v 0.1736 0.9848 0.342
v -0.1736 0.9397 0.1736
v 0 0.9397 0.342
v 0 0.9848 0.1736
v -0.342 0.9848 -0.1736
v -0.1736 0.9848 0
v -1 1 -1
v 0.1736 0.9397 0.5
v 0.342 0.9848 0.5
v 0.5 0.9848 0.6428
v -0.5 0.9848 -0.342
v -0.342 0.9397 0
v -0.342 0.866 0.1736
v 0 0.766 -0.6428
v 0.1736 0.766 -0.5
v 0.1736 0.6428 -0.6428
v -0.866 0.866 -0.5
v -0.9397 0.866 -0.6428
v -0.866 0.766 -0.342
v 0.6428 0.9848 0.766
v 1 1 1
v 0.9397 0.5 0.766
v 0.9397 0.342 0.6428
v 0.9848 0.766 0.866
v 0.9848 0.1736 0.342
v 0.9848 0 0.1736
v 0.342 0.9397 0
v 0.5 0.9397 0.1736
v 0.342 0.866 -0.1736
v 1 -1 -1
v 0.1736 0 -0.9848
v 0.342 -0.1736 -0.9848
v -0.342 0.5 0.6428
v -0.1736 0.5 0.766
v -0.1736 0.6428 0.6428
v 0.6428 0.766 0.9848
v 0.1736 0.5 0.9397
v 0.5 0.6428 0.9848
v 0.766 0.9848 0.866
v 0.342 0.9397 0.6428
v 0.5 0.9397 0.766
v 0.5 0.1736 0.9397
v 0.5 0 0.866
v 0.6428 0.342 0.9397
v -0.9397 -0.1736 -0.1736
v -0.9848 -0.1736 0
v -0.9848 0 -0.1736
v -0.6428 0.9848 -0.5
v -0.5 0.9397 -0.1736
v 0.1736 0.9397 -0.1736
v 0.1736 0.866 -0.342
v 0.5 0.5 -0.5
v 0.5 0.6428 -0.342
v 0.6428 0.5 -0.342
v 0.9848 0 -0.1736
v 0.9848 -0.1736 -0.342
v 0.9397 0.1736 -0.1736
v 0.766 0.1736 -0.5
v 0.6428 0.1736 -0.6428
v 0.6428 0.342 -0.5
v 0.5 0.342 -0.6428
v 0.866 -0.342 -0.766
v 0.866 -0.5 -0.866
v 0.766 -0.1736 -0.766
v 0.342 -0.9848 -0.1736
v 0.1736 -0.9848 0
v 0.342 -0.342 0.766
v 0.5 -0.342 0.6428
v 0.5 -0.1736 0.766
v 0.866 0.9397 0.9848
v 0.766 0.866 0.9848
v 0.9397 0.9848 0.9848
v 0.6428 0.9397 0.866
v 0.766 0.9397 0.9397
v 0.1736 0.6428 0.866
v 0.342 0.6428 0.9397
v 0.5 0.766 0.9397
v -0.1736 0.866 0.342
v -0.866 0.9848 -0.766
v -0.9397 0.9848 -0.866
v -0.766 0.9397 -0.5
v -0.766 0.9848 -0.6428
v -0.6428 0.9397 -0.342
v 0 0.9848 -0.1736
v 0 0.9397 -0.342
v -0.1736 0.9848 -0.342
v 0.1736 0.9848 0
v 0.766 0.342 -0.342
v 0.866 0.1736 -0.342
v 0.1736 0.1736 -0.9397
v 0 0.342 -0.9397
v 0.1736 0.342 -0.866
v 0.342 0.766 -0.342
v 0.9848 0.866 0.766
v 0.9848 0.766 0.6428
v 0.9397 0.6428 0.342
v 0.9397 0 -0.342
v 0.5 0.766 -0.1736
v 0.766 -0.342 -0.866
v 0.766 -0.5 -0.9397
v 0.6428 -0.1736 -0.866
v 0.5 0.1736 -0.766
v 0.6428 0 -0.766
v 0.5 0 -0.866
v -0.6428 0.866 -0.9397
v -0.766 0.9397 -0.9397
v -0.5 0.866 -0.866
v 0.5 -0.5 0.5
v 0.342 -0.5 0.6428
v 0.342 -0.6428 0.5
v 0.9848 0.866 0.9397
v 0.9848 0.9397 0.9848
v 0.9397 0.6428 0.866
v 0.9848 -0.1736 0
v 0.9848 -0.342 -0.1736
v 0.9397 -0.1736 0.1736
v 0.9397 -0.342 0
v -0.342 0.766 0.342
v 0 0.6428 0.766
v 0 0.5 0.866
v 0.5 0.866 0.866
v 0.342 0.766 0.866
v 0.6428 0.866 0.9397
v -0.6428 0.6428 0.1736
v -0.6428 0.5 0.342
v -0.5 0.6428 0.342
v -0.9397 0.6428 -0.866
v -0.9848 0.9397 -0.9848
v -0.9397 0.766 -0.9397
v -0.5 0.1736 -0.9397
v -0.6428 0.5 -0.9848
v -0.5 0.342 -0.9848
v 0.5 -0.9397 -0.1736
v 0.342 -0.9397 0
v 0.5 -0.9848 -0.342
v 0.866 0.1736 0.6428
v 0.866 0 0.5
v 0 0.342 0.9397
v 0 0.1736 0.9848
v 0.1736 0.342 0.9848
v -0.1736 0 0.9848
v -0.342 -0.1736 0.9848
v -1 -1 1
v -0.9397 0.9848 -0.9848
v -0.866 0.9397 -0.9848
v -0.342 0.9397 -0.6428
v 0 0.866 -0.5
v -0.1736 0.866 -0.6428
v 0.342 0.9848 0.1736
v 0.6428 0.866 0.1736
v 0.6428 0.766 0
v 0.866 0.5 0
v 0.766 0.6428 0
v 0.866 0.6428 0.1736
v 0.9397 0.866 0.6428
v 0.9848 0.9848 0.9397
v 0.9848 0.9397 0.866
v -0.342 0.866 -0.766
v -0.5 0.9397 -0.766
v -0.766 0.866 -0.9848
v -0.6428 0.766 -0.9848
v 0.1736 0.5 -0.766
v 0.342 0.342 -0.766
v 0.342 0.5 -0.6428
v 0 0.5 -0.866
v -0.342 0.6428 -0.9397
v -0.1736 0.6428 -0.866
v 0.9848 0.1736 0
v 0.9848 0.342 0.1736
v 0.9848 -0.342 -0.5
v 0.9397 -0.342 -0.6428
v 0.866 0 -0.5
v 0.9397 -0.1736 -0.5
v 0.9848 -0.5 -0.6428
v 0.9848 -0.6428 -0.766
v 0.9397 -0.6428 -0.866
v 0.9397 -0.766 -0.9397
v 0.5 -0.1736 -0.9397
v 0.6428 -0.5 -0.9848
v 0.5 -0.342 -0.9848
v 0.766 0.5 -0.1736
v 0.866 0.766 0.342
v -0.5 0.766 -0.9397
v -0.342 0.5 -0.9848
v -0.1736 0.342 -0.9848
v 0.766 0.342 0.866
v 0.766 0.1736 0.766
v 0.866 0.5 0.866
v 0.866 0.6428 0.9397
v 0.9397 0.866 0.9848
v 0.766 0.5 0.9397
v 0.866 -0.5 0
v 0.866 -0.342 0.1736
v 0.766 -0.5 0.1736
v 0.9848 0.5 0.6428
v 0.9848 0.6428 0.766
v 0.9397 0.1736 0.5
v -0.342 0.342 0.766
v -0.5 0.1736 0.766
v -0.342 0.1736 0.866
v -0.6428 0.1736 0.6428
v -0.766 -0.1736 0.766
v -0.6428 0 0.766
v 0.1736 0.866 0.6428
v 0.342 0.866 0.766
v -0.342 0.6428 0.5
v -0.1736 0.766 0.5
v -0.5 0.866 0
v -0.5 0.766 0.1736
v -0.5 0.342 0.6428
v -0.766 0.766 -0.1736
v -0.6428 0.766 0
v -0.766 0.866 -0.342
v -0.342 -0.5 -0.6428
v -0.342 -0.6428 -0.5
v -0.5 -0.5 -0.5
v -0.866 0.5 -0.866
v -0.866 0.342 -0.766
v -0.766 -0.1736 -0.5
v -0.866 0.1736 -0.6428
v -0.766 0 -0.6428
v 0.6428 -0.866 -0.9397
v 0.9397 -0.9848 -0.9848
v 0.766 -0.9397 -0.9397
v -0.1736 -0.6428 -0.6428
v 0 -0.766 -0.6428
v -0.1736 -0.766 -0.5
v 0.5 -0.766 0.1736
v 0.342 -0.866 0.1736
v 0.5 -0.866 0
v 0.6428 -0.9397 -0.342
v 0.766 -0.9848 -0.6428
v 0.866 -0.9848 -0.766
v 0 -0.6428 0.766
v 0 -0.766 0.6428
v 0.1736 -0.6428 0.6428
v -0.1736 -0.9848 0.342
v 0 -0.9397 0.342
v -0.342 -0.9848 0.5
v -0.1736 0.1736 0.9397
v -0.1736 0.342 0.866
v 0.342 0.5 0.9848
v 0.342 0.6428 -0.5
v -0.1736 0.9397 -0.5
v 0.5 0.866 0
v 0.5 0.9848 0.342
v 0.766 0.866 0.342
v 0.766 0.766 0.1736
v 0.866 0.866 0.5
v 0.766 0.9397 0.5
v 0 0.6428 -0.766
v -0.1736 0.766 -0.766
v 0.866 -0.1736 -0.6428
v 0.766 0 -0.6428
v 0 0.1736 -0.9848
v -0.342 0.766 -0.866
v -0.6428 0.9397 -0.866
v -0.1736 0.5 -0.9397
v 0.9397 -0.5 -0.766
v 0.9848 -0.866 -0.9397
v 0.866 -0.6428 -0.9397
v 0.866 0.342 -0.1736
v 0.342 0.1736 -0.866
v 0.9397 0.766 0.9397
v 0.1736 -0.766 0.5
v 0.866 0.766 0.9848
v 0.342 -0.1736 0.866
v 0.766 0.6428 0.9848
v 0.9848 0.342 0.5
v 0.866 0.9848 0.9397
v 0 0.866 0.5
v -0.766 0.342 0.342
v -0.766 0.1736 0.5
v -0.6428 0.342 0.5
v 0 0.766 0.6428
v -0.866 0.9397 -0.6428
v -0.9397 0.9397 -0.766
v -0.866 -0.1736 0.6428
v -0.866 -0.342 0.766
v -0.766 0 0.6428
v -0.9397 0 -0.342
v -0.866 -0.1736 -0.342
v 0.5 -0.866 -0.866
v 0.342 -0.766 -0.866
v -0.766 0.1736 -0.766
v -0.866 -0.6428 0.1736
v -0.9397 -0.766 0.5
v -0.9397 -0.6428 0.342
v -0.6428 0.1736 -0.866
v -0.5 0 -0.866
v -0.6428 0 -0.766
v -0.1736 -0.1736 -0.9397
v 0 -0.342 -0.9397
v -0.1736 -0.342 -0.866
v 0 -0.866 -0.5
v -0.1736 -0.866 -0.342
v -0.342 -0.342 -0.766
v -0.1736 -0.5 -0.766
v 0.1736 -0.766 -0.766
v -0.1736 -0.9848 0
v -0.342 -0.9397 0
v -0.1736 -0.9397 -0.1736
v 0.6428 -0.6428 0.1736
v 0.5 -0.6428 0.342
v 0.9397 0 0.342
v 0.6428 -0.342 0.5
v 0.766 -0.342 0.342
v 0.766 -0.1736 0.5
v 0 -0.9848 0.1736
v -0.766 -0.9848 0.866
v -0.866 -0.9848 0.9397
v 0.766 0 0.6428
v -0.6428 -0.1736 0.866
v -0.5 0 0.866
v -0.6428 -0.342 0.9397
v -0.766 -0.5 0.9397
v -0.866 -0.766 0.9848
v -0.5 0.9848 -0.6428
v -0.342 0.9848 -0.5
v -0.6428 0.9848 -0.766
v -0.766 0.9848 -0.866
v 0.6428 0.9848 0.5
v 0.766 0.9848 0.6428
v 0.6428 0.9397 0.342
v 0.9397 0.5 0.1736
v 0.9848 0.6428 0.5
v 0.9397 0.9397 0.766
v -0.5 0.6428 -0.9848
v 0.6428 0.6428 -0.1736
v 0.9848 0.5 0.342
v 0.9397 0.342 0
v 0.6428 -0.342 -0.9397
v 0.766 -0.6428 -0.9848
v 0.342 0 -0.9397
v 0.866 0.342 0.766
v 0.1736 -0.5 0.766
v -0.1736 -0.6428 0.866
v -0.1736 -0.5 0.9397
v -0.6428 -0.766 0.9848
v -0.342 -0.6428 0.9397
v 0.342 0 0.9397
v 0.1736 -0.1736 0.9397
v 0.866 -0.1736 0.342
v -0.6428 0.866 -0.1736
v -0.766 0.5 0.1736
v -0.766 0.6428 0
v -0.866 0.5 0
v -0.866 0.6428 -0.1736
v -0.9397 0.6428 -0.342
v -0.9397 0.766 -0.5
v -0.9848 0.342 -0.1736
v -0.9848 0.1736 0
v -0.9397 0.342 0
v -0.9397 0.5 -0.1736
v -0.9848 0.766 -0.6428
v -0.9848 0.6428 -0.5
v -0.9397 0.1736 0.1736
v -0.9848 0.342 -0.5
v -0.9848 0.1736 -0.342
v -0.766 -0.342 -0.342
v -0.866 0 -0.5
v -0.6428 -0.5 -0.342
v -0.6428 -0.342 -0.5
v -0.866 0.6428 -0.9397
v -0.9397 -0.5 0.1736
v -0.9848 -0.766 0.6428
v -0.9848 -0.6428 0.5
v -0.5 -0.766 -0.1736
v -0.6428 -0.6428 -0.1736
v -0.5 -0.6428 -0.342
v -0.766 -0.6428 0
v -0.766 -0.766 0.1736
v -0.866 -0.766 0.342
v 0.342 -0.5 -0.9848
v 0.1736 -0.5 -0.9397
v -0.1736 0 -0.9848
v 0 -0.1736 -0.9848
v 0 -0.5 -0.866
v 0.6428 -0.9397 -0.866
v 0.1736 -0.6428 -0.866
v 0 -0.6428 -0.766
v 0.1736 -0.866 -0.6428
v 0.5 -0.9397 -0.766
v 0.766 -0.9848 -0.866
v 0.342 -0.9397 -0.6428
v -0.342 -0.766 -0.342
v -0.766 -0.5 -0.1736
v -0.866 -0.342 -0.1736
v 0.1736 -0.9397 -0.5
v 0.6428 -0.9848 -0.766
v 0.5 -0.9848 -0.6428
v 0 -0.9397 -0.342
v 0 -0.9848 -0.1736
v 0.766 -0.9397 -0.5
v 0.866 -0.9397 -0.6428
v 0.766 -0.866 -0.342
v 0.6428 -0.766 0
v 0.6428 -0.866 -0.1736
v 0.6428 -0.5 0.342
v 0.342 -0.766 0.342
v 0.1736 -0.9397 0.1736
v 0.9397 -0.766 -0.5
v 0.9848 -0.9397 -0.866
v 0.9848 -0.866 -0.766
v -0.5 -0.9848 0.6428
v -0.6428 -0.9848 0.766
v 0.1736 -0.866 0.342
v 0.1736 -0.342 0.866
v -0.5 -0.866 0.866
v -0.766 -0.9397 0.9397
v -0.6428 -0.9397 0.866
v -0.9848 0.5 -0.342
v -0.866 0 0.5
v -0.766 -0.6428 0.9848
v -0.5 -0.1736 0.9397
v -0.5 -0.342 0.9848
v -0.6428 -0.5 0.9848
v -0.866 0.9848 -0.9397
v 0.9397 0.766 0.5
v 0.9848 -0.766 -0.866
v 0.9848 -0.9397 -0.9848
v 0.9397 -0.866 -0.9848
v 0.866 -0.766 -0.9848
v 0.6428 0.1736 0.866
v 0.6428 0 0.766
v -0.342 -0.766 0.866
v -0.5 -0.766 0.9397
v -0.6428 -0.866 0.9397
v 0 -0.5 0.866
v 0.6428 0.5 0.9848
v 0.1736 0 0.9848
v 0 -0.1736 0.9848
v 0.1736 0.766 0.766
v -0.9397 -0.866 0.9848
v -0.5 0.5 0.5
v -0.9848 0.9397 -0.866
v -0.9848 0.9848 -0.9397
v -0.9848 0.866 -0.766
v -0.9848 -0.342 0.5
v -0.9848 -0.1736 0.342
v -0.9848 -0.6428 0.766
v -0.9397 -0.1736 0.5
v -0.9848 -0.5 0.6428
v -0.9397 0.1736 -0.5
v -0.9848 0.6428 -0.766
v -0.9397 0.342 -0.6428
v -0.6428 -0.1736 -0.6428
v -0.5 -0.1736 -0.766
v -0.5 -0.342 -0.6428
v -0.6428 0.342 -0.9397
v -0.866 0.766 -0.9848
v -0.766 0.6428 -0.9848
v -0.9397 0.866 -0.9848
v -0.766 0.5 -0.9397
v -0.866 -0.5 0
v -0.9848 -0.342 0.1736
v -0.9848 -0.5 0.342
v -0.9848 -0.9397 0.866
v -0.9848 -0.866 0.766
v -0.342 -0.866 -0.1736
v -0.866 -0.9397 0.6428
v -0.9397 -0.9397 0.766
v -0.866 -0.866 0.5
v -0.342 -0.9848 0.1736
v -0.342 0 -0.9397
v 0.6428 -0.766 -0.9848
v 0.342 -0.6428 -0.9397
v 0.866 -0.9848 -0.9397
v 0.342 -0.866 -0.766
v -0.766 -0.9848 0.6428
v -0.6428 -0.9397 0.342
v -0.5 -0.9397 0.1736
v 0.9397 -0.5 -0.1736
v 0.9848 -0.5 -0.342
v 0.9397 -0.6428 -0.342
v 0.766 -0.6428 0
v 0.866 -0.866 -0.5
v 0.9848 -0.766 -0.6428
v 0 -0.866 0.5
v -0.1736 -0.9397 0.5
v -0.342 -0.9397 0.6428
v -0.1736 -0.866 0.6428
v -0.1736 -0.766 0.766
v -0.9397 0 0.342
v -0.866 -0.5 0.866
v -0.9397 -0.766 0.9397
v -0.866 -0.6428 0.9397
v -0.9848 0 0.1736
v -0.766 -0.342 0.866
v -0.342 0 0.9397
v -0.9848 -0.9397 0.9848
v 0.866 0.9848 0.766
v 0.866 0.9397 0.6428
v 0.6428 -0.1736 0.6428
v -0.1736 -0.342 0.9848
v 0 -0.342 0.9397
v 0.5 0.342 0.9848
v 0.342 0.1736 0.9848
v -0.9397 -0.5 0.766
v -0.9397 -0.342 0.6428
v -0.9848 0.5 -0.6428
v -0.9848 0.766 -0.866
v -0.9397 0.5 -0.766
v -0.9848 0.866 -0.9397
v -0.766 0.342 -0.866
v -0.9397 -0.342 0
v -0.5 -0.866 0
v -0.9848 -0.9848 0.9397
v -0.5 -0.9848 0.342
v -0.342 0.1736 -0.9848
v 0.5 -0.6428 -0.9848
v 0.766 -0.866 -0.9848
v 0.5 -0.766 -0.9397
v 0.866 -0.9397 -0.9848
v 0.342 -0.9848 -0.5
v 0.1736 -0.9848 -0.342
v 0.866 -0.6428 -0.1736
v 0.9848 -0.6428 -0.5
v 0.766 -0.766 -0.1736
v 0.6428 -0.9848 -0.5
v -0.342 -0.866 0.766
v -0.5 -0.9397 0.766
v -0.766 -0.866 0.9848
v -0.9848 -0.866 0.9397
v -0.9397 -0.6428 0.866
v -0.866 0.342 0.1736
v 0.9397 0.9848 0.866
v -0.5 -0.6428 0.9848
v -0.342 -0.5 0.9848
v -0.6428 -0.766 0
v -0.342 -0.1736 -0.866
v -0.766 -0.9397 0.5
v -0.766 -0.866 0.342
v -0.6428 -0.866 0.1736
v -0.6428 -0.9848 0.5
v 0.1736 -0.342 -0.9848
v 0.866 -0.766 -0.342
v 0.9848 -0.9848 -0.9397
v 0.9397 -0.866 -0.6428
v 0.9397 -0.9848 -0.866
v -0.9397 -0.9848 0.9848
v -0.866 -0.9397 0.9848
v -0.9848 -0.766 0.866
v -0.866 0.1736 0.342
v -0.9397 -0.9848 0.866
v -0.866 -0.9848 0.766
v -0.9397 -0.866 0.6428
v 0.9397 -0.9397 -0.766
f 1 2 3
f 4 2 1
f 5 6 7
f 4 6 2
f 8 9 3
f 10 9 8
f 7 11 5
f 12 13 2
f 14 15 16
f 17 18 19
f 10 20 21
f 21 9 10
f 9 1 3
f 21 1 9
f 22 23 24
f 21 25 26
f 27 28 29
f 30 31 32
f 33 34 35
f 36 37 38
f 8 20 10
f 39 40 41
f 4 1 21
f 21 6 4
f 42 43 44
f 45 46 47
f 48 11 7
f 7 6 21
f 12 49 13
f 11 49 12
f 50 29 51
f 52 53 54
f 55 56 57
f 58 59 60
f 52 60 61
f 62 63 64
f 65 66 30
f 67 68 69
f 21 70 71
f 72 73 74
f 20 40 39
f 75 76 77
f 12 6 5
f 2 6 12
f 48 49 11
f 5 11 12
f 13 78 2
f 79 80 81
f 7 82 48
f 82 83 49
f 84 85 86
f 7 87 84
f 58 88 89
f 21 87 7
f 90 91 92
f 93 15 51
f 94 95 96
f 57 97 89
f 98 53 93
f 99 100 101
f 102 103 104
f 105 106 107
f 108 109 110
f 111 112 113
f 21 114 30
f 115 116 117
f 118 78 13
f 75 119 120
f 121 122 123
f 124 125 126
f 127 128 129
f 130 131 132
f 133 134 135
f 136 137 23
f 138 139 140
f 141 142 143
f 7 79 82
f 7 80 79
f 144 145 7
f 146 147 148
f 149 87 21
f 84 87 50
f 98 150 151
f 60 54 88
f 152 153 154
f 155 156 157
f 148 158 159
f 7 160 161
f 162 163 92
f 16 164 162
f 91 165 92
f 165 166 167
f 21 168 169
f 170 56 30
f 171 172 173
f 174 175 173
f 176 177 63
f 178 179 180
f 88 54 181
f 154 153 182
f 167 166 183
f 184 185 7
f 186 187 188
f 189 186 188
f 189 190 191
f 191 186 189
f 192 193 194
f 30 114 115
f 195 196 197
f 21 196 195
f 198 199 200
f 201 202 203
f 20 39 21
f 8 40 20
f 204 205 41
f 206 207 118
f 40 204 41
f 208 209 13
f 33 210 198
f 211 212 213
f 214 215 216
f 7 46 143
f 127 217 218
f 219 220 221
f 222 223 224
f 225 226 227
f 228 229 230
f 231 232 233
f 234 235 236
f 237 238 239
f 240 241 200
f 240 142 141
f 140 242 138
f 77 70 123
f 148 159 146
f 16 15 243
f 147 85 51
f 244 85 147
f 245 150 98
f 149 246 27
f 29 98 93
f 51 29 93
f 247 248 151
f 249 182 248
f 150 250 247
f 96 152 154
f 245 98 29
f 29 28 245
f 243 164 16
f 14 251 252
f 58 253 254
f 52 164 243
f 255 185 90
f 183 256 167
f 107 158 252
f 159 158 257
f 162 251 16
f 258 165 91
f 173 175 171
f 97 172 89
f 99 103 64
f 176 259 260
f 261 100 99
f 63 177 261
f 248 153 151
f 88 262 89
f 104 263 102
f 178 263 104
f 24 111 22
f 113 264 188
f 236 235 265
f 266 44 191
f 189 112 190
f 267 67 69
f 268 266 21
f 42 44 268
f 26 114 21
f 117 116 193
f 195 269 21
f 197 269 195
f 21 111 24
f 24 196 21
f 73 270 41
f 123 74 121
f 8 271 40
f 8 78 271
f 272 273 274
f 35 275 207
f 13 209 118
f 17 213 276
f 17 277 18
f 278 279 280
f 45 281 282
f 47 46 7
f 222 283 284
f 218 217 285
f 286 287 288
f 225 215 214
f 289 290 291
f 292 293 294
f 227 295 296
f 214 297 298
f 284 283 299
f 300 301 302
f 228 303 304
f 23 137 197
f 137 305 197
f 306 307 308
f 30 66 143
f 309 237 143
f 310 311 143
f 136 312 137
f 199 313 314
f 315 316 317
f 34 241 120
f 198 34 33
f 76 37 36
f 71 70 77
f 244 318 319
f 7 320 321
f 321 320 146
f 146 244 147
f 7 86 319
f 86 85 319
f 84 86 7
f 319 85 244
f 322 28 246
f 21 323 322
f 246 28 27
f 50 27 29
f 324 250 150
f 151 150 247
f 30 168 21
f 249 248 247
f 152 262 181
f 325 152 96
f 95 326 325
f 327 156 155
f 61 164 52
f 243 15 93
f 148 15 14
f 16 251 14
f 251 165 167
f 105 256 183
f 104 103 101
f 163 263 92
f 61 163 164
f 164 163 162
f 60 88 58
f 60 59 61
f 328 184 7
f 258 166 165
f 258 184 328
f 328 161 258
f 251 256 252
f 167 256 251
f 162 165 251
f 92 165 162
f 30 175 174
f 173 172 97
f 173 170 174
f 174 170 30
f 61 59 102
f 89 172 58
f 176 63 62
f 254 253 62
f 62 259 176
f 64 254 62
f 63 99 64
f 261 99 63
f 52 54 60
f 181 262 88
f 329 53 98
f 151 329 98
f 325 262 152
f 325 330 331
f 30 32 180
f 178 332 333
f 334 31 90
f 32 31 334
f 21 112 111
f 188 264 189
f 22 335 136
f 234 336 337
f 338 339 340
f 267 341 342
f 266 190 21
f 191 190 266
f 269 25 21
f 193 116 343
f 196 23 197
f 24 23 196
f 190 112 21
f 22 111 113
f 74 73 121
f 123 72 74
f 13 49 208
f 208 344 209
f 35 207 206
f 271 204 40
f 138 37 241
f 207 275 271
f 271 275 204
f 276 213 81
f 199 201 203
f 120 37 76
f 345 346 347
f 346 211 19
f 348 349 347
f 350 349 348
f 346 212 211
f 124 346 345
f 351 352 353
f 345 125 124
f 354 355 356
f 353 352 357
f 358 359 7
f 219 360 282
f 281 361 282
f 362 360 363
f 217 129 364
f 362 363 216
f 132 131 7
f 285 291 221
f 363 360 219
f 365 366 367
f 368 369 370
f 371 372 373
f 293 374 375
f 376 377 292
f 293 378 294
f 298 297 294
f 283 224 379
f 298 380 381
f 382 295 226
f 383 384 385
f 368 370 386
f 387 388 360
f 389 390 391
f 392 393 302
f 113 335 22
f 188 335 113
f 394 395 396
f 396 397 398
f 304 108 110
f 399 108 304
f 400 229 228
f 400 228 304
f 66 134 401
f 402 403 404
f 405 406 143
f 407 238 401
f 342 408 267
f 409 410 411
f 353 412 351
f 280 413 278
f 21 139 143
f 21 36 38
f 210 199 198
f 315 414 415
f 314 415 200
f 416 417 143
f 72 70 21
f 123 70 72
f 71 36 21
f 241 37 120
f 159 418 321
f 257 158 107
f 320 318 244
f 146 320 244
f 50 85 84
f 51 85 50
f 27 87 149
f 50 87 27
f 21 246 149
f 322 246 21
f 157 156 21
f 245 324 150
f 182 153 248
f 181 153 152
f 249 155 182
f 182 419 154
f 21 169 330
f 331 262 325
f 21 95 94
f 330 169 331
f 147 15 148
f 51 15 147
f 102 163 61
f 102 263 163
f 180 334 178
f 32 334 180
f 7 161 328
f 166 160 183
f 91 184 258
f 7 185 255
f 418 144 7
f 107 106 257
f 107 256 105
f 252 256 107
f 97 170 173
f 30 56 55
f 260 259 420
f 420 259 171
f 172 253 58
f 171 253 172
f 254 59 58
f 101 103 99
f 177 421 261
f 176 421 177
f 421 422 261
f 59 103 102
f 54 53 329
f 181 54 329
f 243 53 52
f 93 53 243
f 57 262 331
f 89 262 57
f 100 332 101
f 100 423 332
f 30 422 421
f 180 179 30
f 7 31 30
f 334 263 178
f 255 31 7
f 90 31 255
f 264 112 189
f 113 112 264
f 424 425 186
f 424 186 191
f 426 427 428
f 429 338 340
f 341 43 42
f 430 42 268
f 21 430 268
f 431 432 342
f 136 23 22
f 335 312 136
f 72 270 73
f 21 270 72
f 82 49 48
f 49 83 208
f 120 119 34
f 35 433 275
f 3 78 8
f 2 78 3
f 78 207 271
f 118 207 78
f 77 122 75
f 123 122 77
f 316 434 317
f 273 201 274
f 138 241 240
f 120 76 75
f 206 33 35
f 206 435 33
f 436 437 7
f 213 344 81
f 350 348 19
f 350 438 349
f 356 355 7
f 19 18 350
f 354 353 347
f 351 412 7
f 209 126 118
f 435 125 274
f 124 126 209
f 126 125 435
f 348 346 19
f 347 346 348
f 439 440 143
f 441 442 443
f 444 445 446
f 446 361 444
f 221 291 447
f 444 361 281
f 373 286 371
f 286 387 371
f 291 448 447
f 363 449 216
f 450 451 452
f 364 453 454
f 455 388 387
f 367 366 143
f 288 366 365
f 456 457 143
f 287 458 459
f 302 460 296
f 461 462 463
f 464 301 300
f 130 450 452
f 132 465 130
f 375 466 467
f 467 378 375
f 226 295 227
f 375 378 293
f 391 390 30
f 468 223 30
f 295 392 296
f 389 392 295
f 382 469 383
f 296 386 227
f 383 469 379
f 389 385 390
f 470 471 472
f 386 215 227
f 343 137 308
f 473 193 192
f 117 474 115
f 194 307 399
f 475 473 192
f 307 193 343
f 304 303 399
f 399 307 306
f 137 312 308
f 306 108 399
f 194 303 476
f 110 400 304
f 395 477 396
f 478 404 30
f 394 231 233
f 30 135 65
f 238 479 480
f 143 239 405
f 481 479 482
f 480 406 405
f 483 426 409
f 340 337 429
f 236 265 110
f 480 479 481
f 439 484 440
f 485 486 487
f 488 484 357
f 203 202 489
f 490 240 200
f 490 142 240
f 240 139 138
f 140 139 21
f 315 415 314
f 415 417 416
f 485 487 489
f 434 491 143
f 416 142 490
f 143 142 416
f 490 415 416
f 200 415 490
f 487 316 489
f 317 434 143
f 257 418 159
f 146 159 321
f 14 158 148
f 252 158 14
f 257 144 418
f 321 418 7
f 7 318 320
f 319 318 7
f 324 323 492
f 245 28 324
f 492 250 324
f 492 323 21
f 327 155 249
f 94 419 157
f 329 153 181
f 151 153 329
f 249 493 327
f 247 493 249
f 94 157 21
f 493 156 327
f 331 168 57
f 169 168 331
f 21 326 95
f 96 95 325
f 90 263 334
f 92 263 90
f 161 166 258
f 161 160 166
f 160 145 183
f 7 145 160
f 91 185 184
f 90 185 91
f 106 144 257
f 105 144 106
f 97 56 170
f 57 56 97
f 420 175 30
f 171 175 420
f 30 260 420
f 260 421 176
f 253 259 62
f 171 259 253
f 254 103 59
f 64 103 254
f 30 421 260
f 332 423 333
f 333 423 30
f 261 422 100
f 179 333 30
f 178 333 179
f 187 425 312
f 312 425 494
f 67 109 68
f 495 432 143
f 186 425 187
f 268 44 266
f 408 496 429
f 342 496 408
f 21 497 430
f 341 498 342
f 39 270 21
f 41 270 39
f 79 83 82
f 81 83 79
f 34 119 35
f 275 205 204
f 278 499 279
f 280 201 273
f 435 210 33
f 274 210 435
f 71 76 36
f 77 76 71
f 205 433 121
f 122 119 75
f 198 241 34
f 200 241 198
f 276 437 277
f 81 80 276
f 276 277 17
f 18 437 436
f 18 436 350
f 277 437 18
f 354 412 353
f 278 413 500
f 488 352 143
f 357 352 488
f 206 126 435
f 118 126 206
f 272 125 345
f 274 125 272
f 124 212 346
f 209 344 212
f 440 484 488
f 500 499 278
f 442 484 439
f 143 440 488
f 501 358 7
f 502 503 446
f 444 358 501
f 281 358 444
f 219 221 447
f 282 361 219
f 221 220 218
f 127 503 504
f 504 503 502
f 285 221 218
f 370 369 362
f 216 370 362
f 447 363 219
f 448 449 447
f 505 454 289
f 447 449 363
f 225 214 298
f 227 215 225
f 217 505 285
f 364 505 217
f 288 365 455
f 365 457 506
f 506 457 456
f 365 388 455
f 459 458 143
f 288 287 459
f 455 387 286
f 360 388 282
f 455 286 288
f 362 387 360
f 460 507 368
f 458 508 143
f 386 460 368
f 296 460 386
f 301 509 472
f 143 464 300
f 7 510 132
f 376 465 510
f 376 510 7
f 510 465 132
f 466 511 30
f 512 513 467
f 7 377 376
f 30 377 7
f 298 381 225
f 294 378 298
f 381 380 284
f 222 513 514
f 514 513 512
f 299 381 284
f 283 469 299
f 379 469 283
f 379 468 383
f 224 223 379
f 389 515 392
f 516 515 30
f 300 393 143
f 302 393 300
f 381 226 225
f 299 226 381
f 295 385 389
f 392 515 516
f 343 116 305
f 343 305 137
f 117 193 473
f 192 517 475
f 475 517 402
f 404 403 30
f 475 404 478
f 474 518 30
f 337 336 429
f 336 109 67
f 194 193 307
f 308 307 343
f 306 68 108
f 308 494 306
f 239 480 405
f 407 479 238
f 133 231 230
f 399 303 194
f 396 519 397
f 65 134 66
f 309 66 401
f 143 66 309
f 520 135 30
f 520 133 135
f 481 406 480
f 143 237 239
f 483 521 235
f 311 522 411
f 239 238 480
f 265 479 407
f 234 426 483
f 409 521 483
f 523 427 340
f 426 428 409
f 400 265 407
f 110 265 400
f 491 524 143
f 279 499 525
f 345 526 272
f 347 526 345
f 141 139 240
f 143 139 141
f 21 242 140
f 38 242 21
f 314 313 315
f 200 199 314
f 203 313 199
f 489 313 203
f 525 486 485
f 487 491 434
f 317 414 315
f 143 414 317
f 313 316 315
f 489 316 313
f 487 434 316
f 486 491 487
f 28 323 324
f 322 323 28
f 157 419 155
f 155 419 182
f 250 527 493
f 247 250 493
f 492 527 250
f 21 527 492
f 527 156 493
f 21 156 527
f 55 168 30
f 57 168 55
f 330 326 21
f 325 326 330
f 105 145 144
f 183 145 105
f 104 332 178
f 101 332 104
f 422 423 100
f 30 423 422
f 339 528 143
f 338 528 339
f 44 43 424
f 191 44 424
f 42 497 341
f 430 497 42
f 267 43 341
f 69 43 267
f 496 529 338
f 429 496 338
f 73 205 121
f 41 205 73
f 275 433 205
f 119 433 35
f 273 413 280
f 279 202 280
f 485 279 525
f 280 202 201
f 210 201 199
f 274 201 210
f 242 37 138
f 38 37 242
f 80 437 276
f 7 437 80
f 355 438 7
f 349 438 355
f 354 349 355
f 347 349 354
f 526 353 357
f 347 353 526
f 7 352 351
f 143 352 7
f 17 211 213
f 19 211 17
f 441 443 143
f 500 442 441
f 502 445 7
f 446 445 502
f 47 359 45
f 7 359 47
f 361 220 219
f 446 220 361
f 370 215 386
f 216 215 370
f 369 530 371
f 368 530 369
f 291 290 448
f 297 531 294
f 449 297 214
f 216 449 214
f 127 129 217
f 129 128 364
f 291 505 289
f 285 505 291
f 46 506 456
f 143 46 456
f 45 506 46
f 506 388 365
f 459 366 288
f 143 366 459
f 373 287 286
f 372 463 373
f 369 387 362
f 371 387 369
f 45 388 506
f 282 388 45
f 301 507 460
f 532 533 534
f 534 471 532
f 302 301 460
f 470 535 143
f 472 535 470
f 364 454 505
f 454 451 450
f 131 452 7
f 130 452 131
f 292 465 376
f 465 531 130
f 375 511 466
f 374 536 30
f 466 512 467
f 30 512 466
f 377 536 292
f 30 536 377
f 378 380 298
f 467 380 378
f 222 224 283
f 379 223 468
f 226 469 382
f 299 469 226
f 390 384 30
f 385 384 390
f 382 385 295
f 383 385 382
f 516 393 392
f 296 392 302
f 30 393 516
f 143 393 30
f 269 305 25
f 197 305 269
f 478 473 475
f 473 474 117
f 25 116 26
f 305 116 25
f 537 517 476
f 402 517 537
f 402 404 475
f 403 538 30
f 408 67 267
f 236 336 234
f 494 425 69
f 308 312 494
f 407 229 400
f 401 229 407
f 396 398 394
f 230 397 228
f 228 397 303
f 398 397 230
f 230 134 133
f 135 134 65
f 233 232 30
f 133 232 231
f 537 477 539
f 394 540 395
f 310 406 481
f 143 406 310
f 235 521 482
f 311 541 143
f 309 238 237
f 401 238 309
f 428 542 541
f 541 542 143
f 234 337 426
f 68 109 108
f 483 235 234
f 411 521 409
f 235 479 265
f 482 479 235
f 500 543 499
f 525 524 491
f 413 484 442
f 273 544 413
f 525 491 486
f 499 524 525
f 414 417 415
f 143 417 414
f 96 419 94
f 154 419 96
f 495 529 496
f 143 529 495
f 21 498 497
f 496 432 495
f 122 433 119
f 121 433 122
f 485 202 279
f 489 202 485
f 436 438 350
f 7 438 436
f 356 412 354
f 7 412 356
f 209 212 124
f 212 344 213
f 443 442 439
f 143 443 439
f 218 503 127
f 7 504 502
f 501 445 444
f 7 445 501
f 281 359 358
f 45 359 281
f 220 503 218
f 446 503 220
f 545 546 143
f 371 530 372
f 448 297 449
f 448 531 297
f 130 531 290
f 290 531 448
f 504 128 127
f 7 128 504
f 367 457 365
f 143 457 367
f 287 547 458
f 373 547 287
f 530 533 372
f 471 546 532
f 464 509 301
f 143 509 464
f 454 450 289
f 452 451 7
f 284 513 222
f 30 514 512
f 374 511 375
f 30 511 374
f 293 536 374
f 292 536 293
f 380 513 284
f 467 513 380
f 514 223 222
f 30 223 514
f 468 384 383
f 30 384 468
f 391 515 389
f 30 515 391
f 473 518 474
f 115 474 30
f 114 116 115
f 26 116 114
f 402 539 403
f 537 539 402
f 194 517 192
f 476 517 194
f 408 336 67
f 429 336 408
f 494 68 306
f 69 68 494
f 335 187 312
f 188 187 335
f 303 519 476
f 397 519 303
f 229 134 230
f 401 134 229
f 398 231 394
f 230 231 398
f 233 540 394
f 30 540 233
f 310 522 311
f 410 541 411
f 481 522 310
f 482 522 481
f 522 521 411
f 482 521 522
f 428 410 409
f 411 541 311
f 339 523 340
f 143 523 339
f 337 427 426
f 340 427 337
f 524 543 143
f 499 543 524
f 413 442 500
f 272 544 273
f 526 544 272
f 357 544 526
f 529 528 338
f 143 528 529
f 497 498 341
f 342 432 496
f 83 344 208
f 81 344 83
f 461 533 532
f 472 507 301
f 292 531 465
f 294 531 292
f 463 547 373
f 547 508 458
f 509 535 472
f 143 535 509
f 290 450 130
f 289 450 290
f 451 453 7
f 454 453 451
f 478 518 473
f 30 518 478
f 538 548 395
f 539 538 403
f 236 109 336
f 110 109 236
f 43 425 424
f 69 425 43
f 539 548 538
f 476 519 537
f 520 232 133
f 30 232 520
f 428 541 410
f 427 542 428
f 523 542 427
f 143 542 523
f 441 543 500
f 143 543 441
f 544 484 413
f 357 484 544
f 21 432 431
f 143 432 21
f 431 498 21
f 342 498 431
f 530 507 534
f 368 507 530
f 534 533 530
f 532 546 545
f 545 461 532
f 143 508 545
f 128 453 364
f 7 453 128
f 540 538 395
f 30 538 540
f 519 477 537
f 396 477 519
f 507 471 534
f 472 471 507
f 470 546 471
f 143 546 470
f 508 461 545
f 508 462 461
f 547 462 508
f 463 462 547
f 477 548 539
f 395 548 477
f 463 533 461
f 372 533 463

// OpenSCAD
p=[for(i=[0:10:360],j=[0:10:360])[sin(i),cos(j),sin(j+i)]];
f=[for(i=[0:len(p)-3])[i,i+1,i+2]];
hull()
polyhedron(p,f);
